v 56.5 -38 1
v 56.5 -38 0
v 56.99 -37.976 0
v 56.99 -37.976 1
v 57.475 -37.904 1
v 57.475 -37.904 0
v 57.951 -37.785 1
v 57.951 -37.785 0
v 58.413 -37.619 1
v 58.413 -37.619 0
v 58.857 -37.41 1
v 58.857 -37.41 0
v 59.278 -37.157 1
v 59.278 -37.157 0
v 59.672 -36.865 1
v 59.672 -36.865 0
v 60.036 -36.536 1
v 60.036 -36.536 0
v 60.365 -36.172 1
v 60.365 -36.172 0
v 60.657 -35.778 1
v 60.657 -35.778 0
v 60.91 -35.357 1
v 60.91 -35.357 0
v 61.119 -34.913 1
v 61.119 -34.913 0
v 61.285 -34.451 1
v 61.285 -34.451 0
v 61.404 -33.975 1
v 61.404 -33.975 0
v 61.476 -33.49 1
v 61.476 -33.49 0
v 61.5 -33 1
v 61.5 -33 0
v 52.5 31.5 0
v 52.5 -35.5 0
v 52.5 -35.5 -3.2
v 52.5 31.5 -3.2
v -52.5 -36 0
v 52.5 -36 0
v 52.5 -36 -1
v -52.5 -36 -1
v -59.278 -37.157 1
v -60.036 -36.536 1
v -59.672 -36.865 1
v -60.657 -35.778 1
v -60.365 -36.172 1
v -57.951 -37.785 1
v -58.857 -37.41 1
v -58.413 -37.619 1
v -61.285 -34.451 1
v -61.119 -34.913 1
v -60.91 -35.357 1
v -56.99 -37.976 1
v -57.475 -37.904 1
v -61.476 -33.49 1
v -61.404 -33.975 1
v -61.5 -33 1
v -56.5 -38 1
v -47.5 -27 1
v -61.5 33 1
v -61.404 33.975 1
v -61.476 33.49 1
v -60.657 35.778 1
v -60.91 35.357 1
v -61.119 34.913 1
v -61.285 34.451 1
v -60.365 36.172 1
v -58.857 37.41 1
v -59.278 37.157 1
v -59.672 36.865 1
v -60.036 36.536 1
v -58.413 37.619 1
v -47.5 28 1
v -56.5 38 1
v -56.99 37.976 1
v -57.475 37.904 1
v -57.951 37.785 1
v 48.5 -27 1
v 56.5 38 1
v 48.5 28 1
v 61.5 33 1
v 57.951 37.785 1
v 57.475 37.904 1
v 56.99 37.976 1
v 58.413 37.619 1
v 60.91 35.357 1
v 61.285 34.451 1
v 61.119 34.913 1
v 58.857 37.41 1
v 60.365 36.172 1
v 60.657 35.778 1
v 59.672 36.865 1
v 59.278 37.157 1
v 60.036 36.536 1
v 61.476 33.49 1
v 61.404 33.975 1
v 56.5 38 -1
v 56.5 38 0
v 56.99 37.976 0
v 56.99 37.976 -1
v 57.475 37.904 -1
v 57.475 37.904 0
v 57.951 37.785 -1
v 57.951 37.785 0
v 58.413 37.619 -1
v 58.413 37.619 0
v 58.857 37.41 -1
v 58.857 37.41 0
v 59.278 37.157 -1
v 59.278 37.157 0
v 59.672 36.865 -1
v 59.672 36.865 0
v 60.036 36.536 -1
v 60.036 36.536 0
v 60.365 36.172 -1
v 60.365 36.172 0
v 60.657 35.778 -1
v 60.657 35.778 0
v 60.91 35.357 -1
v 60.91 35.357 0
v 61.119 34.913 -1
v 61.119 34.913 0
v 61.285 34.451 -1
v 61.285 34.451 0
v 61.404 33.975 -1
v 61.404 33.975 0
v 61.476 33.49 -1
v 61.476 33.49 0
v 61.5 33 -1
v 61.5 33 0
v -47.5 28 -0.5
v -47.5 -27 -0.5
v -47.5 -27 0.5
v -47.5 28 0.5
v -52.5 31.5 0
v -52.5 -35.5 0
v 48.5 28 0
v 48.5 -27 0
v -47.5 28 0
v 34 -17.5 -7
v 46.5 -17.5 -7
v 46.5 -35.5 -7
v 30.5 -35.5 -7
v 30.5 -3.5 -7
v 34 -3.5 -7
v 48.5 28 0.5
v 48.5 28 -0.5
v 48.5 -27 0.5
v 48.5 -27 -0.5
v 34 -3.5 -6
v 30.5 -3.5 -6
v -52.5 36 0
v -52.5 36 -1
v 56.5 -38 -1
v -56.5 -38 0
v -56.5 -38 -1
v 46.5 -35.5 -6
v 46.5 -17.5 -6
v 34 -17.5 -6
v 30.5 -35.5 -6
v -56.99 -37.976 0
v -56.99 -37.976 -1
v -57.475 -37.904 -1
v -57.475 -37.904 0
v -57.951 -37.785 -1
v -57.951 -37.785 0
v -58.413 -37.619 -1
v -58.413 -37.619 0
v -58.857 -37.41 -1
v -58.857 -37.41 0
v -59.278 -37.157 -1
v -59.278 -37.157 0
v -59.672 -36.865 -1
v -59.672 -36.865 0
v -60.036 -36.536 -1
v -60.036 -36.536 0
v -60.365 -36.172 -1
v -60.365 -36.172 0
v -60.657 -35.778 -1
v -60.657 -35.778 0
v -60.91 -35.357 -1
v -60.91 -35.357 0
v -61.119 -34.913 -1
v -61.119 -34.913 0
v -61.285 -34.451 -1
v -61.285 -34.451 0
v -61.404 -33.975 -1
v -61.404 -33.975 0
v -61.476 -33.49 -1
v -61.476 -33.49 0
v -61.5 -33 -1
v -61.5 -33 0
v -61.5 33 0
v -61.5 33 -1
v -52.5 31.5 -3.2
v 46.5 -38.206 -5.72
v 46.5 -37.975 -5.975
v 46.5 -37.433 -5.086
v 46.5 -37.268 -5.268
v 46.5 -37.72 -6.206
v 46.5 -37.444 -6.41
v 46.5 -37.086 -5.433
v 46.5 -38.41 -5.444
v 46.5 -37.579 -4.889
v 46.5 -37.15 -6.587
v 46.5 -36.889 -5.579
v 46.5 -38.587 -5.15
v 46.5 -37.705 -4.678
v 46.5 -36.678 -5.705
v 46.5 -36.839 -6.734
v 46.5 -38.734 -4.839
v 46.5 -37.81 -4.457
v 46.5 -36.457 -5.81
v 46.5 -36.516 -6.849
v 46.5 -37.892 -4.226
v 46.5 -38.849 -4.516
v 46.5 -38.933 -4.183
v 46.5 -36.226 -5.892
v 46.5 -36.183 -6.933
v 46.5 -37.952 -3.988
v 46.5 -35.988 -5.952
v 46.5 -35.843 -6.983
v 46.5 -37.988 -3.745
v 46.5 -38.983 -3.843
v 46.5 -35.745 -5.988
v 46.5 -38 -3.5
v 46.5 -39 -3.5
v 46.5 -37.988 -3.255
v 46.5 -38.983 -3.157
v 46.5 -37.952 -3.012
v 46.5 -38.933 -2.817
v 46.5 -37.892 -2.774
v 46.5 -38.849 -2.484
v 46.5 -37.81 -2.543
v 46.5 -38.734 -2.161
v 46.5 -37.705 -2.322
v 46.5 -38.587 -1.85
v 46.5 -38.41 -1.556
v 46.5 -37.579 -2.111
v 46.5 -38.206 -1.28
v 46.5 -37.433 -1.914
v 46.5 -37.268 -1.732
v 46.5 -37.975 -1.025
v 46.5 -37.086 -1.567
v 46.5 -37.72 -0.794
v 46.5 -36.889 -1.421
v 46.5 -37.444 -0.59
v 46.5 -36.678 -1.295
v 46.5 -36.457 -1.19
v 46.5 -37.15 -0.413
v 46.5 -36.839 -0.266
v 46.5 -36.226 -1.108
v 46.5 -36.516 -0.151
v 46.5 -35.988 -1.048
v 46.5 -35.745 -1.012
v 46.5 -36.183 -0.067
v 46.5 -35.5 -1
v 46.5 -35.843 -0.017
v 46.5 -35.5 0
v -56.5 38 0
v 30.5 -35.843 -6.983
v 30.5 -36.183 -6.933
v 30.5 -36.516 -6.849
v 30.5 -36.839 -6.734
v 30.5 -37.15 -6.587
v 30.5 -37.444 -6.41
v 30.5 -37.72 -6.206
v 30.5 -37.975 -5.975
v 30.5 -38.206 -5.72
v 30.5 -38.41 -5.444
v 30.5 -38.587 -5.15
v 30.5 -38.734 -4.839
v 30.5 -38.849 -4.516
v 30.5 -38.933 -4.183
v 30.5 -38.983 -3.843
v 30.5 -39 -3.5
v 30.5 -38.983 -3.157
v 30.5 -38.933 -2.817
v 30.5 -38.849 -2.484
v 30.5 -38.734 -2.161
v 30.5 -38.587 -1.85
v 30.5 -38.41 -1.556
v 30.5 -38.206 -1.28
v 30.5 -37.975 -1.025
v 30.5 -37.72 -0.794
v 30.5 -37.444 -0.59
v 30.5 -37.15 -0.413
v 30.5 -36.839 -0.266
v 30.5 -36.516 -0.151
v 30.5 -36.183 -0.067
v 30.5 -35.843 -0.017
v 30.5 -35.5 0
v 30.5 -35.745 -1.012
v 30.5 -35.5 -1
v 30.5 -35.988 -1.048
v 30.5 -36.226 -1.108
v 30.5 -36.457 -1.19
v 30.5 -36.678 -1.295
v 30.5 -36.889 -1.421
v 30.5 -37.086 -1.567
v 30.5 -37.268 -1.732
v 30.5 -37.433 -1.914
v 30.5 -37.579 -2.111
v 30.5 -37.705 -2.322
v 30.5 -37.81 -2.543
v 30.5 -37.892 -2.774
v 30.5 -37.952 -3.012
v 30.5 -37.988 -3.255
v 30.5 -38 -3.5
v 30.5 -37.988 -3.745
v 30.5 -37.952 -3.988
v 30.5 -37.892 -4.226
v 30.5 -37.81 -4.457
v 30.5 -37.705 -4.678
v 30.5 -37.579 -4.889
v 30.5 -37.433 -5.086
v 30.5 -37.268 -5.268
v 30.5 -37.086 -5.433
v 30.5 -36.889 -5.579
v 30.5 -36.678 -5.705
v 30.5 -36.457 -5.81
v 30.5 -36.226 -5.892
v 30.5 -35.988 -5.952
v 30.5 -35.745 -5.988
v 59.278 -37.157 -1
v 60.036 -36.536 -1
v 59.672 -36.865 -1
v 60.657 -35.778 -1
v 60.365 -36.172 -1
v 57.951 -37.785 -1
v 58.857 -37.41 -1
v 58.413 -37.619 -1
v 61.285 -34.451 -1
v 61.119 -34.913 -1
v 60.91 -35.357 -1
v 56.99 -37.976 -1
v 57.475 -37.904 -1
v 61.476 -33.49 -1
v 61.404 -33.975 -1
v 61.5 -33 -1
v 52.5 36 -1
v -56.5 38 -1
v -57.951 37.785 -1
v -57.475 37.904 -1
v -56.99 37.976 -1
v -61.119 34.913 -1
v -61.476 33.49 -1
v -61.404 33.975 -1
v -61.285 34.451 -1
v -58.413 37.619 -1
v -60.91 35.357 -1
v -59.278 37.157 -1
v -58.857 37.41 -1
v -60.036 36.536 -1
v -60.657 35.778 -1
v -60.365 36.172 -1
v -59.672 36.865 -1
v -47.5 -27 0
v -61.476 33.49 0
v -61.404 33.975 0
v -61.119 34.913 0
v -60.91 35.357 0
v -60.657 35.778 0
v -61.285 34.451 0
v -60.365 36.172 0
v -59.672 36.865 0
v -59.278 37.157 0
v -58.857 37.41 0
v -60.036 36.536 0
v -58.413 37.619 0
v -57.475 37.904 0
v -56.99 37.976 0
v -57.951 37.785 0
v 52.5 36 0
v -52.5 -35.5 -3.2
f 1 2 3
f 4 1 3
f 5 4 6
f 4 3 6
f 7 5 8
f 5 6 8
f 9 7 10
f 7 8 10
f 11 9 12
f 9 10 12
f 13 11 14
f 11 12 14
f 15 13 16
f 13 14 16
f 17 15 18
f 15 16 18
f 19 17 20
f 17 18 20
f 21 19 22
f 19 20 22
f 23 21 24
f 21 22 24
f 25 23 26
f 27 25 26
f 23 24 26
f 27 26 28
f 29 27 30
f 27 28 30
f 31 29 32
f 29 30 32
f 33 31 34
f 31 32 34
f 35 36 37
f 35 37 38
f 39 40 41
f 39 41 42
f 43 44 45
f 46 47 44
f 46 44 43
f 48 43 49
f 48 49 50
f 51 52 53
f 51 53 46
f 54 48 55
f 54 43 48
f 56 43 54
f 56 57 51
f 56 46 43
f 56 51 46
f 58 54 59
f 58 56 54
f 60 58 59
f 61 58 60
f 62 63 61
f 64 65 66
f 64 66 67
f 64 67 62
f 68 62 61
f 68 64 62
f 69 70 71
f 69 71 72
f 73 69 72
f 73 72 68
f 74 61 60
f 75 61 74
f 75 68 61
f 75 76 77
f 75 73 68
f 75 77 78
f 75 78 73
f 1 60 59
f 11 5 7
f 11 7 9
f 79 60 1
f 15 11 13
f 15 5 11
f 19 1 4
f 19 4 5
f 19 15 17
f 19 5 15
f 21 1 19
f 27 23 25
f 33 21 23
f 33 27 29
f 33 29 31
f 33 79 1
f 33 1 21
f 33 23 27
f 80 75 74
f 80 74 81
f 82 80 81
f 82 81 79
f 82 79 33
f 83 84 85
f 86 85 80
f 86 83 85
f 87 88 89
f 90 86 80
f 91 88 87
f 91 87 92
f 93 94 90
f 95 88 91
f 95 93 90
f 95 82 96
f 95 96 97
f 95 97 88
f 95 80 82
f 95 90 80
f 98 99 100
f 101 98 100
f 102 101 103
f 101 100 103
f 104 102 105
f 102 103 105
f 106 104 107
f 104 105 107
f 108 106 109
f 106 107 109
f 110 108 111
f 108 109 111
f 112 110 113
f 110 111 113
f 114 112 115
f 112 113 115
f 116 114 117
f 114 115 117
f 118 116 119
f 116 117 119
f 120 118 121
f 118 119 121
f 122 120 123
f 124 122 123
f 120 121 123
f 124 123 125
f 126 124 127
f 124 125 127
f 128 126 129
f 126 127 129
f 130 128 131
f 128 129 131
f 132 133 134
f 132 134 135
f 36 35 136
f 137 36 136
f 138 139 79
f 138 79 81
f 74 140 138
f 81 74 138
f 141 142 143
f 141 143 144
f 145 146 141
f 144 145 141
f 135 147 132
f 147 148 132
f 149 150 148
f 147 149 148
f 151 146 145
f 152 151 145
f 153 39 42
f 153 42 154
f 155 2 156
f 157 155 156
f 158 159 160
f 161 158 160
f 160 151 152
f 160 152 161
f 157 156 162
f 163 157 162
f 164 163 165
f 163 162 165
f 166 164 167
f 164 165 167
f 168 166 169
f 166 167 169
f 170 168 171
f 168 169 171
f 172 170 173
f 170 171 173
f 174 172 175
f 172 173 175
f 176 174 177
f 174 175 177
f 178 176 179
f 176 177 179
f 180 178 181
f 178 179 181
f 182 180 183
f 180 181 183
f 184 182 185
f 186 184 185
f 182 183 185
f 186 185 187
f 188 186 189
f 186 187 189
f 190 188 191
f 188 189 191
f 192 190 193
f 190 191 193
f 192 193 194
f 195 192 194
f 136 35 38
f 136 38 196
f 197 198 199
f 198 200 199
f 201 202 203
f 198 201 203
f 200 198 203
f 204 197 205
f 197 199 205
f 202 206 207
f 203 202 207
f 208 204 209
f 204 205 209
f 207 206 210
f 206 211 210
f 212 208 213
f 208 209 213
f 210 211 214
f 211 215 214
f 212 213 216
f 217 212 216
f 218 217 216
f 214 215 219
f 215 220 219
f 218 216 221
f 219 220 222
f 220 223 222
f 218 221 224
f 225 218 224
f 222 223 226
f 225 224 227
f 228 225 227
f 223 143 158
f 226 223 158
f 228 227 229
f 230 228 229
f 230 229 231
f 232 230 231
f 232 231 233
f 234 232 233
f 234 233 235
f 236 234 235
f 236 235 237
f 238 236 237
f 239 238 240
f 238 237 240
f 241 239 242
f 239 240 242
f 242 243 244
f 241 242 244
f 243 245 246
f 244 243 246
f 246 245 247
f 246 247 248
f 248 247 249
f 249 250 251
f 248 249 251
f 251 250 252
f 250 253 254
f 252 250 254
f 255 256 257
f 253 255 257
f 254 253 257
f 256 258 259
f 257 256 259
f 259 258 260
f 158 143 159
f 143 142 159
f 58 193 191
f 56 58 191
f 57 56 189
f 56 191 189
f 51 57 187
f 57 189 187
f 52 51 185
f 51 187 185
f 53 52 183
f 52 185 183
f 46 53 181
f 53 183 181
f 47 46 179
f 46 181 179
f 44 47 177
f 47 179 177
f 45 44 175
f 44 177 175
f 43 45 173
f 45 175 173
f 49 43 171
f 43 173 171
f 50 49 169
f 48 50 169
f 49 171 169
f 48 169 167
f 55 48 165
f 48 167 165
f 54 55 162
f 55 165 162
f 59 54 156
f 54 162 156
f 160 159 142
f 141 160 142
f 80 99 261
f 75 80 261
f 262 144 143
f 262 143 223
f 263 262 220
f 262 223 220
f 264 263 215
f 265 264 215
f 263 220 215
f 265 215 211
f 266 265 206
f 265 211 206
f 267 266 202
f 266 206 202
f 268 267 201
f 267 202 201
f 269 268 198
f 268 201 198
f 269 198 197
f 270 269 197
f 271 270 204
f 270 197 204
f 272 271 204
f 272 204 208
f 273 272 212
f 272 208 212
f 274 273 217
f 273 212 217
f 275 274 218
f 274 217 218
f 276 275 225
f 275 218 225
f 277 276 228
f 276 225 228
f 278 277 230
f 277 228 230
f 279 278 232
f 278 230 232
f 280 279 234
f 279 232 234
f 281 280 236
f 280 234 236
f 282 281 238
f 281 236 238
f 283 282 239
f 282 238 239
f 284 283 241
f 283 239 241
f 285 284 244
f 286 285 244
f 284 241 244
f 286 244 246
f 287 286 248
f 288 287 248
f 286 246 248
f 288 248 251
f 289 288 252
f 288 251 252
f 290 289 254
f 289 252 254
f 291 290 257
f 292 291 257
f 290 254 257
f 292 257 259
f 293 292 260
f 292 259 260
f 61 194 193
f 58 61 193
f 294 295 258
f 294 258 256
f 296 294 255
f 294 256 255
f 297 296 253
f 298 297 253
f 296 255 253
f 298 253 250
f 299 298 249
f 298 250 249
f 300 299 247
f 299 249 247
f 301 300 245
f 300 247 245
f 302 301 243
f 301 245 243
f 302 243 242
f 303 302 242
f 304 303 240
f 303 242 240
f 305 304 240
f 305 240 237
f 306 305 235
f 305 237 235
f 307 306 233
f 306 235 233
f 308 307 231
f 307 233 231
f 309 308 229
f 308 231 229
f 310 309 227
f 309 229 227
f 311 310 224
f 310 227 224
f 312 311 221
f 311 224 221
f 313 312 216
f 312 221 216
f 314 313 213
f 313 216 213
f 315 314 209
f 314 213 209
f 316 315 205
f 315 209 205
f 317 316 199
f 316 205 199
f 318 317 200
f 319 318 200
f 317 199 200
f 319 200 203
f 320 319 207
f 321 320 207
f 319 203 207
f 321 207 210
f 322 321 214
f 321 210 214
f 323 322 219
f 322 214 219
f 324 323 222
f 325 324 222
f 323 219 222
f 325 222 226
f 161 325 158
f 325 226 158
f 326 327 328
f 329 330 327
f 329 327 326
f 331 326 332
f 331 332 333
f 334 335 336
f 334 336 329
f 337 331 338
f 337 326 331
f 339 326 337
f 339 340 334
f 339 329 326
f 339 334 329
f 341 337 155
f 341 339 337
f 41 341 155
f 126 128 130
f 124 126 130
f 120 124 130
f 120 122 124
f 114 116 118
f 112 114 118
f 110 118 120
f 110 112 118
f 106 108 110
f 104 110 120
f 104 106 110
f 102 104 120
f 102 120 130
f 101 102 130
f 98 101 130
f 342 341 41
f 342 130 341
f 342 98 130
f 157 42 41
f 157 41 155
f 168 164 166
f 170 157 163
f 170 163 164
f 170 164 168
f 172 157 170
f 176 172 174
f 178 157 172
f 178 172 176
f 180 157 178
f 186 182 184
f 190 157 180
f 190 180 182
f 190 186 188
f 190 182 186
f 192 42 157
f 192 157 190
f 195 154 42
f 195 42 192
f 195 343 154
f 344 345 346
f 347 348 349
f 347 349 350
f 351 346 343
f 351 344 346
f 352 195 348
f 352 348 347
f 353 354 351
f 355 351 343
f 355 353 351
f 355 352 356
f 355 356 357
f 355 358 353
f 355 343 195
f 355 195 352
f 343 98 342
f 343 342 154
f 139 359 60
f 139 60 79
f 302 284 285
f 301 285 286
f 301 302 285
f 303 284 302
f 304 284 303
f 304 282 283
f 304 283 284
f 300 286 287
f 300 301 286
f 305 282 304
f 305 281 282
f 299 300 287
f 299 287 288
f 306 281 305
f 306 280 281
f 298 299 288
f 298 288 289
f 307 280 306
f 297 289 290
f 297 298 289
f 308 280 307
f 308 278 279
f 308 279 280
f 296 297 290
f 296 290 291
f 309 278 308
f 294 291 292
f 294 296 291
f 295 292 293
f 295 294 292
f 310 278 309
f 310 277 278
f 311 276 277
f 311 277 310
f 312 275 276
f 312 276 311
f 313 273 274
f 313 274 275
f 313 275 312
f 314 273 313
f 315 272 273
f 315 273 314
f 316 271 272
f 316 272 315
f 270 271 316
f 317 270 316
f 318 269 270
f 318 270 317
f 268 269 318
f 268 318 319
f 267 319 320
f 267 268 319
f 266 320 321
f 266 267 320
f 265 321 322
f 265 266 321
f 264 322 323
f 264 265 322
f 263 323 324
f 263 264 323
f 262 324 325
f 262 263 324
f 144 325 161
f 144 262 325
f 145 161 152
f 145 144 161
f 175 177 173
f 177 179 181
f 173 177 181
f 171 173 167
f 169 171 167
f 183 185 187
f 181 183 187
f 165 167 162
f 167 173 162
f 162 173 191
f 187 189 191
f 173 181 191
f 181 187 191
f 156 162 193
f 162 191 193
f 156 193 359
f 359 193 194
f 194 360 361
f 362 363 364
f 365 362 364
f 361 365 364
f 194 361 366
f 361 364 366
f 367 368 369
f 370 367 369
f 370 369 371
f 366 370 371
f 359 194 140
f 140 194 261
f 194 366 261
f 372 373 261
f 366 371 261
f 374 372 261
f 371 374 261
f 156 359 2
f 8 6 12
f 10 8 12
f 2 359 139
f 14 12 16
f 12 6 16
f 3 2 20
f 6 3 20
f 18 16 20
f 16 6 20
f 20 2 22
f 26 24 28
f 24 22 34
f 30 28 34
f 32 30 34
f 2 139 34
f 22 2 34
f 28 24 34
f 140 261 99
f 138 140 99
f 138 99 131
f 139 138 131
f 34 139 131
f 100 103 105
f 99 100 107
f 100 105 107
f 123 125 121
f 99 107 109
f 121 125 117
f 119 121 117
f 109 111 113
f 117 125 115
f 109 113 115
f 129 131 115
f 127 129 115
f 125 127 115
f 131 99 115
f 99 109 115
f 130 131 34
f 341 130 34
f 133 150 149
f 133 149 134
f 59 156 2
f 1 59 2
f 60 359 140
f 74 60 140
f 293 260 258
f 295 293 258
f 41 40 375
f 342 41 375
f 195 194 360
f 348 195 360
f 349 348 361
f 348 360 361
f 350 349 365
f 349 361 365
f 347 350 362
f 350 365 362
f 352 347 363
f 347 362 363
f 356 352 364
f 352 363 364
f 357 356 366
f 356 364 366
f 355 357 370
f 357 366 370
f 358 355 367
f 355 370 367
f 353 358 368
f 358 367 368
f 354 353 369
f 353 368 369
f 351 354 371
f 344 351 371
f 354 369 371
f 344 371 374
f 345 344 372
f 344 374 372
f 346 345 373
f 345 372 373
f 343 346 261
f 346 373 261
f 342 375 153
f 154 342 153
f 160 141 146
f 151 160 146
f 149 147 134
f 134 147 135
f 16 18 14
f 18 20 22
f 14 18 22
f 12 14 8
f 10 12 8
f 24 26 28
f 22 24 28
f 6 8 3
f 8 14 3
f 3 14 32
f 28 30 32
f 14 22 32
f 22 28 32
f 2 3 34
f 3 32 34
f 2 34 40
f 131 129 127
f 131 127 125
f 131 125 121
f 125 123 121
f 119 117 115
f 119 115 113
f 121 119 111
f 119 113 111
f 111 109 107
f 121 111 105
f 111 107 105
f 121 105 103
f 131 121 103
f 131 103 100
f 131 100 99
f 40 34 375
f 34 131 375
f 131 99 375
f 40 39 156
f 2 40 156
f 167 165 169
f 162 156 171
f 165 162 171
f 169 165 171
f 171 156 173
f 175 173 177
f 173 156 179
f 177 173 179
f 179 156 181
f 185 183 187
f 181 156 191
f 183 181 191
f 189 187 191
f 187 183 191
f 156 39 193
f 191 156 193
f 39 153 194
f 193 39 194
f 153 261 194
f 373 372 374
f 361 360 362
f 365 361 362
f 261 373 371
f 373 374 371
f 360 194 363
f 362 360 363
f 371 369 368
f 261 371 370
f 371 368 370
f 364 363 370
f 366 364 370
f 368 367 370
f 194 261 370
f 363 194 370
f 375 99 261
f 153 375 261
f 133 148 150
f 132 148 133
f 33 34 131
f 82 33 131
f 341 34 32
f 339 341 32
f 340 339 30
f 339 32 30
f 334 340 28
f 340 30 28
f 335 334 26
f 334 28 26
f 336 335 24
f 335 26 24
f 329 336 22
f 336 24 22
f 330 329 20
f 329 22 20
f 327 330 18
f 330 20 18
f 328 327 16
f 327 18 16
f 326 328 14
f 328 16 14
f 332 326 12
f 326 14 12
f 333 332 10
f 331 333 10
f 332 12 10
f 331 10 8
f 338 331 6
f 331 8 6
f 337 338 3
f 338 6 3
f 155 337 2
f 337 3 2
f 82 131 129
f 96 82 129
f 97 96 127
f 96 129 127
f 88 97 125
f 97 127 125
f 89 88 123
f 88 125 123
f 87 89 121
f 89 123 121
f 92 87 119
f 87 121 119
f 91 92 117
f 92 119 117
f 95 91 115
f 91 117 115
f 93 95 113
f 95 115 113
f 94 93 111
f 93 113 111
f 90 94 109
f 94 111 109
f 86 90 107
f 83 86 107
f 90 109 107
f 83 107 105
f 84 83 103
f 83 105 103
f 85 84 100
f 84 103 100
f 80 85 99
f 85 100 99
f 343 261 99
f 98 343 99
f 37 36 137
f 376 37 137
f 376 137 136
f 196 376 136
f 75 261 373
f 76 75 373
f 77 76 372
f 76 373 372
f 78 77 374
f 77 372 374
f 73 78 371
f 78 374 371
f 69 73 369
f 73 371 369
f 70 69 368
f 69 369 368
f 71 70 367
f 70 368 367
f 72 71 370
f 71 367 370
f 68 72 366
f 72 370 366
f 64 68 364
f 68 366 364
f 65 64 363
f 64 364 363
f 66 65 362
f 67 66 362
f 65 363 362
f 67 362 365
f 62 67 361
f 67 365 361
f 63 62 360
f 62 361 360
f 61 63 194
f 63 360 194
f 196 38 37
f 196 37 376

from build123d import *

# Parameters (mm, degrees)
SKETCH1_W           = 96
SKETCH1_H           = 55
BOSS_EXTRUDE1_DEPTH = 1
SKETCH2_W           = 96
SKETCH2_H           = 55
BOSS_EXTRUDE2_DEPTH = 0.5
SKETCH3_W           = 105
SKETCH3_H           = 72
BOSS_EXTRUDE3_DEPTH = 1
EXTRUDE_THIN2_DEPTH = 16
SKETCH5_W           = 3.5
SKETCH5_H           = 14
BOSS_EXTRUDE4_DEPTH = 1
SKETCH6_W           = 105
SKETCH6_H           = 67
BOSS_EXTRUDE5_DEPTH = 3.2


with BuildPart() as part:
    # Sketch1 → Boss-Extrude1 (new body)
    with BuildSketch(Plane.XY):
        with BuildLine():
            Line((-56.5, -38), (56.5, -38))
            ThreePointArc((56.5, -38), (60.035533906, -36.535533906), (61.5, -33))
            Line((61.5, -33), (61.5, 33))
            ThreePointArc((61.5, 33), (60.035533906, 36.535533906), (56.5, 38))
            Line((56.5, 38), (-56.5, 38))
            ThreePointArc((-56.5, 38), (-60.035533906, 36.535533906), (-61.5, 33))
            Line((-61.5, 33), (-61.5, -33))
            ThreePointArc((-61.5, -33), (-60.035533906, -36.535533906), (-56.5, -38))
        make_face()
        with Locations((0.5, 0.5)):
            Rectangle(SKETCH1_W, SKETCH1_H, mode=Mode.SUBTRACT)
    extrude(amount=BOSS_EXTRUDE1_DEPTH)


with BuildPart() as body_2:
    # Sketch2 → Boss-Extrude2 (new, symmetric)
    with BuildSketch(Plane(origin=(0, 0, 0), x_dir=(-1, 0, 0), z_dir=(0, 0, -1))):
        with Locations((-0.5, 0.5)):
            Rectangle(SKETCH2_W, SKETCH2_H)
    extrude(amount=BOSS_EXTRUDE2_DEPTH, both=True)


with BuildPart() as body_3:
    # Sketch3 → Boss-Extrude3 (new body)
    with BuildSketch(Plane(origin=(0, 0, 0), x_dir=(-1, 0, 0), z_dir=(0, 0, -1))):
        with BuildLine():
            Line((61.5, -33), (61.5, 33))
            ThreePointArc((61.5, 33), (60.035533906, 36.535533906), (56.5, 38))
            Line((56.5, 38), (-56.5, 38))
            ThreePointArc((-56.5, 38), (-60.035533906, 36.535533906), (-61.5, 33))
            Line((-61.5, 33), (-61.5, -33))
            ThreePointArc((-61.5, -33), (-60.035533906, -36.535533906), (-56.5, -38))
            Line((-56.5, -38), (56.5, -38))
            ThreePointArc((56.5, -38), (60.035533906, -36.535533906), (61.5, -33))
        make_face()
        Rectangle(SKETCH3_W, SKETCH3_H, mode=Mode.SUBTRACT)
    extrude(amount=BOSS_EXTRUDE3_DEPTH)


with BuildPart() as body_4:
    # Sketch4 → Extrude-Thin2 (new body)
    with BuildSketch(Plane(origin=(46.5, 0, 0), x_dir=(0, 0, -1), z_dir=(1, 0, 0))):
        with BuildLine():
            ThreePointArc((1, -35.5), (3.5, -38), (6, -35.5))
            Line((6, -35.5), (6, -17.5))
            Line((6, -17.5), (7, -17.5))
            Line((7, -17.5), (7, -35.5))
            ThreePointArc((7, -35.5), (3.5, -39), (0, -35.5))
            Line((0, -35.5), (1, -35.5))
        make_face()
    extrude(amount=-EXTRUDE_THIN2_DEPTH)

    # Sketch5 → Boss-Extrude4 (add)
    with BuildSketch(Plane(origin=(0, 0, -7), x_dir=(-1, 0, 0), z_dir=(0, 0, -1))):
        with Locations((-32.25, -10.5)):
            Rectangle(SKETCH5_W, SKETCH5_H)
    extrude(amount=-BOSS_EXTRUDE4_DEPTH)


with BuildPart() as body_5:
    # Sketch6 → Boss-Extrude5 (new body)
    with BuildSketch(Plane(origin=(0, 0, 0), x_dir=(-1, 0, 0), z_dir=(0, 0, -1))):
        with Locations((0, -2)):
            Rectangle(SKETCH6_W, SKETCH6_H)
    extrude(amount=BOSS_EXTRUDE5_DEPTH)


solid = Compound([part.part, body_2.part, body_3.part, body_4.part, body_5.part])
